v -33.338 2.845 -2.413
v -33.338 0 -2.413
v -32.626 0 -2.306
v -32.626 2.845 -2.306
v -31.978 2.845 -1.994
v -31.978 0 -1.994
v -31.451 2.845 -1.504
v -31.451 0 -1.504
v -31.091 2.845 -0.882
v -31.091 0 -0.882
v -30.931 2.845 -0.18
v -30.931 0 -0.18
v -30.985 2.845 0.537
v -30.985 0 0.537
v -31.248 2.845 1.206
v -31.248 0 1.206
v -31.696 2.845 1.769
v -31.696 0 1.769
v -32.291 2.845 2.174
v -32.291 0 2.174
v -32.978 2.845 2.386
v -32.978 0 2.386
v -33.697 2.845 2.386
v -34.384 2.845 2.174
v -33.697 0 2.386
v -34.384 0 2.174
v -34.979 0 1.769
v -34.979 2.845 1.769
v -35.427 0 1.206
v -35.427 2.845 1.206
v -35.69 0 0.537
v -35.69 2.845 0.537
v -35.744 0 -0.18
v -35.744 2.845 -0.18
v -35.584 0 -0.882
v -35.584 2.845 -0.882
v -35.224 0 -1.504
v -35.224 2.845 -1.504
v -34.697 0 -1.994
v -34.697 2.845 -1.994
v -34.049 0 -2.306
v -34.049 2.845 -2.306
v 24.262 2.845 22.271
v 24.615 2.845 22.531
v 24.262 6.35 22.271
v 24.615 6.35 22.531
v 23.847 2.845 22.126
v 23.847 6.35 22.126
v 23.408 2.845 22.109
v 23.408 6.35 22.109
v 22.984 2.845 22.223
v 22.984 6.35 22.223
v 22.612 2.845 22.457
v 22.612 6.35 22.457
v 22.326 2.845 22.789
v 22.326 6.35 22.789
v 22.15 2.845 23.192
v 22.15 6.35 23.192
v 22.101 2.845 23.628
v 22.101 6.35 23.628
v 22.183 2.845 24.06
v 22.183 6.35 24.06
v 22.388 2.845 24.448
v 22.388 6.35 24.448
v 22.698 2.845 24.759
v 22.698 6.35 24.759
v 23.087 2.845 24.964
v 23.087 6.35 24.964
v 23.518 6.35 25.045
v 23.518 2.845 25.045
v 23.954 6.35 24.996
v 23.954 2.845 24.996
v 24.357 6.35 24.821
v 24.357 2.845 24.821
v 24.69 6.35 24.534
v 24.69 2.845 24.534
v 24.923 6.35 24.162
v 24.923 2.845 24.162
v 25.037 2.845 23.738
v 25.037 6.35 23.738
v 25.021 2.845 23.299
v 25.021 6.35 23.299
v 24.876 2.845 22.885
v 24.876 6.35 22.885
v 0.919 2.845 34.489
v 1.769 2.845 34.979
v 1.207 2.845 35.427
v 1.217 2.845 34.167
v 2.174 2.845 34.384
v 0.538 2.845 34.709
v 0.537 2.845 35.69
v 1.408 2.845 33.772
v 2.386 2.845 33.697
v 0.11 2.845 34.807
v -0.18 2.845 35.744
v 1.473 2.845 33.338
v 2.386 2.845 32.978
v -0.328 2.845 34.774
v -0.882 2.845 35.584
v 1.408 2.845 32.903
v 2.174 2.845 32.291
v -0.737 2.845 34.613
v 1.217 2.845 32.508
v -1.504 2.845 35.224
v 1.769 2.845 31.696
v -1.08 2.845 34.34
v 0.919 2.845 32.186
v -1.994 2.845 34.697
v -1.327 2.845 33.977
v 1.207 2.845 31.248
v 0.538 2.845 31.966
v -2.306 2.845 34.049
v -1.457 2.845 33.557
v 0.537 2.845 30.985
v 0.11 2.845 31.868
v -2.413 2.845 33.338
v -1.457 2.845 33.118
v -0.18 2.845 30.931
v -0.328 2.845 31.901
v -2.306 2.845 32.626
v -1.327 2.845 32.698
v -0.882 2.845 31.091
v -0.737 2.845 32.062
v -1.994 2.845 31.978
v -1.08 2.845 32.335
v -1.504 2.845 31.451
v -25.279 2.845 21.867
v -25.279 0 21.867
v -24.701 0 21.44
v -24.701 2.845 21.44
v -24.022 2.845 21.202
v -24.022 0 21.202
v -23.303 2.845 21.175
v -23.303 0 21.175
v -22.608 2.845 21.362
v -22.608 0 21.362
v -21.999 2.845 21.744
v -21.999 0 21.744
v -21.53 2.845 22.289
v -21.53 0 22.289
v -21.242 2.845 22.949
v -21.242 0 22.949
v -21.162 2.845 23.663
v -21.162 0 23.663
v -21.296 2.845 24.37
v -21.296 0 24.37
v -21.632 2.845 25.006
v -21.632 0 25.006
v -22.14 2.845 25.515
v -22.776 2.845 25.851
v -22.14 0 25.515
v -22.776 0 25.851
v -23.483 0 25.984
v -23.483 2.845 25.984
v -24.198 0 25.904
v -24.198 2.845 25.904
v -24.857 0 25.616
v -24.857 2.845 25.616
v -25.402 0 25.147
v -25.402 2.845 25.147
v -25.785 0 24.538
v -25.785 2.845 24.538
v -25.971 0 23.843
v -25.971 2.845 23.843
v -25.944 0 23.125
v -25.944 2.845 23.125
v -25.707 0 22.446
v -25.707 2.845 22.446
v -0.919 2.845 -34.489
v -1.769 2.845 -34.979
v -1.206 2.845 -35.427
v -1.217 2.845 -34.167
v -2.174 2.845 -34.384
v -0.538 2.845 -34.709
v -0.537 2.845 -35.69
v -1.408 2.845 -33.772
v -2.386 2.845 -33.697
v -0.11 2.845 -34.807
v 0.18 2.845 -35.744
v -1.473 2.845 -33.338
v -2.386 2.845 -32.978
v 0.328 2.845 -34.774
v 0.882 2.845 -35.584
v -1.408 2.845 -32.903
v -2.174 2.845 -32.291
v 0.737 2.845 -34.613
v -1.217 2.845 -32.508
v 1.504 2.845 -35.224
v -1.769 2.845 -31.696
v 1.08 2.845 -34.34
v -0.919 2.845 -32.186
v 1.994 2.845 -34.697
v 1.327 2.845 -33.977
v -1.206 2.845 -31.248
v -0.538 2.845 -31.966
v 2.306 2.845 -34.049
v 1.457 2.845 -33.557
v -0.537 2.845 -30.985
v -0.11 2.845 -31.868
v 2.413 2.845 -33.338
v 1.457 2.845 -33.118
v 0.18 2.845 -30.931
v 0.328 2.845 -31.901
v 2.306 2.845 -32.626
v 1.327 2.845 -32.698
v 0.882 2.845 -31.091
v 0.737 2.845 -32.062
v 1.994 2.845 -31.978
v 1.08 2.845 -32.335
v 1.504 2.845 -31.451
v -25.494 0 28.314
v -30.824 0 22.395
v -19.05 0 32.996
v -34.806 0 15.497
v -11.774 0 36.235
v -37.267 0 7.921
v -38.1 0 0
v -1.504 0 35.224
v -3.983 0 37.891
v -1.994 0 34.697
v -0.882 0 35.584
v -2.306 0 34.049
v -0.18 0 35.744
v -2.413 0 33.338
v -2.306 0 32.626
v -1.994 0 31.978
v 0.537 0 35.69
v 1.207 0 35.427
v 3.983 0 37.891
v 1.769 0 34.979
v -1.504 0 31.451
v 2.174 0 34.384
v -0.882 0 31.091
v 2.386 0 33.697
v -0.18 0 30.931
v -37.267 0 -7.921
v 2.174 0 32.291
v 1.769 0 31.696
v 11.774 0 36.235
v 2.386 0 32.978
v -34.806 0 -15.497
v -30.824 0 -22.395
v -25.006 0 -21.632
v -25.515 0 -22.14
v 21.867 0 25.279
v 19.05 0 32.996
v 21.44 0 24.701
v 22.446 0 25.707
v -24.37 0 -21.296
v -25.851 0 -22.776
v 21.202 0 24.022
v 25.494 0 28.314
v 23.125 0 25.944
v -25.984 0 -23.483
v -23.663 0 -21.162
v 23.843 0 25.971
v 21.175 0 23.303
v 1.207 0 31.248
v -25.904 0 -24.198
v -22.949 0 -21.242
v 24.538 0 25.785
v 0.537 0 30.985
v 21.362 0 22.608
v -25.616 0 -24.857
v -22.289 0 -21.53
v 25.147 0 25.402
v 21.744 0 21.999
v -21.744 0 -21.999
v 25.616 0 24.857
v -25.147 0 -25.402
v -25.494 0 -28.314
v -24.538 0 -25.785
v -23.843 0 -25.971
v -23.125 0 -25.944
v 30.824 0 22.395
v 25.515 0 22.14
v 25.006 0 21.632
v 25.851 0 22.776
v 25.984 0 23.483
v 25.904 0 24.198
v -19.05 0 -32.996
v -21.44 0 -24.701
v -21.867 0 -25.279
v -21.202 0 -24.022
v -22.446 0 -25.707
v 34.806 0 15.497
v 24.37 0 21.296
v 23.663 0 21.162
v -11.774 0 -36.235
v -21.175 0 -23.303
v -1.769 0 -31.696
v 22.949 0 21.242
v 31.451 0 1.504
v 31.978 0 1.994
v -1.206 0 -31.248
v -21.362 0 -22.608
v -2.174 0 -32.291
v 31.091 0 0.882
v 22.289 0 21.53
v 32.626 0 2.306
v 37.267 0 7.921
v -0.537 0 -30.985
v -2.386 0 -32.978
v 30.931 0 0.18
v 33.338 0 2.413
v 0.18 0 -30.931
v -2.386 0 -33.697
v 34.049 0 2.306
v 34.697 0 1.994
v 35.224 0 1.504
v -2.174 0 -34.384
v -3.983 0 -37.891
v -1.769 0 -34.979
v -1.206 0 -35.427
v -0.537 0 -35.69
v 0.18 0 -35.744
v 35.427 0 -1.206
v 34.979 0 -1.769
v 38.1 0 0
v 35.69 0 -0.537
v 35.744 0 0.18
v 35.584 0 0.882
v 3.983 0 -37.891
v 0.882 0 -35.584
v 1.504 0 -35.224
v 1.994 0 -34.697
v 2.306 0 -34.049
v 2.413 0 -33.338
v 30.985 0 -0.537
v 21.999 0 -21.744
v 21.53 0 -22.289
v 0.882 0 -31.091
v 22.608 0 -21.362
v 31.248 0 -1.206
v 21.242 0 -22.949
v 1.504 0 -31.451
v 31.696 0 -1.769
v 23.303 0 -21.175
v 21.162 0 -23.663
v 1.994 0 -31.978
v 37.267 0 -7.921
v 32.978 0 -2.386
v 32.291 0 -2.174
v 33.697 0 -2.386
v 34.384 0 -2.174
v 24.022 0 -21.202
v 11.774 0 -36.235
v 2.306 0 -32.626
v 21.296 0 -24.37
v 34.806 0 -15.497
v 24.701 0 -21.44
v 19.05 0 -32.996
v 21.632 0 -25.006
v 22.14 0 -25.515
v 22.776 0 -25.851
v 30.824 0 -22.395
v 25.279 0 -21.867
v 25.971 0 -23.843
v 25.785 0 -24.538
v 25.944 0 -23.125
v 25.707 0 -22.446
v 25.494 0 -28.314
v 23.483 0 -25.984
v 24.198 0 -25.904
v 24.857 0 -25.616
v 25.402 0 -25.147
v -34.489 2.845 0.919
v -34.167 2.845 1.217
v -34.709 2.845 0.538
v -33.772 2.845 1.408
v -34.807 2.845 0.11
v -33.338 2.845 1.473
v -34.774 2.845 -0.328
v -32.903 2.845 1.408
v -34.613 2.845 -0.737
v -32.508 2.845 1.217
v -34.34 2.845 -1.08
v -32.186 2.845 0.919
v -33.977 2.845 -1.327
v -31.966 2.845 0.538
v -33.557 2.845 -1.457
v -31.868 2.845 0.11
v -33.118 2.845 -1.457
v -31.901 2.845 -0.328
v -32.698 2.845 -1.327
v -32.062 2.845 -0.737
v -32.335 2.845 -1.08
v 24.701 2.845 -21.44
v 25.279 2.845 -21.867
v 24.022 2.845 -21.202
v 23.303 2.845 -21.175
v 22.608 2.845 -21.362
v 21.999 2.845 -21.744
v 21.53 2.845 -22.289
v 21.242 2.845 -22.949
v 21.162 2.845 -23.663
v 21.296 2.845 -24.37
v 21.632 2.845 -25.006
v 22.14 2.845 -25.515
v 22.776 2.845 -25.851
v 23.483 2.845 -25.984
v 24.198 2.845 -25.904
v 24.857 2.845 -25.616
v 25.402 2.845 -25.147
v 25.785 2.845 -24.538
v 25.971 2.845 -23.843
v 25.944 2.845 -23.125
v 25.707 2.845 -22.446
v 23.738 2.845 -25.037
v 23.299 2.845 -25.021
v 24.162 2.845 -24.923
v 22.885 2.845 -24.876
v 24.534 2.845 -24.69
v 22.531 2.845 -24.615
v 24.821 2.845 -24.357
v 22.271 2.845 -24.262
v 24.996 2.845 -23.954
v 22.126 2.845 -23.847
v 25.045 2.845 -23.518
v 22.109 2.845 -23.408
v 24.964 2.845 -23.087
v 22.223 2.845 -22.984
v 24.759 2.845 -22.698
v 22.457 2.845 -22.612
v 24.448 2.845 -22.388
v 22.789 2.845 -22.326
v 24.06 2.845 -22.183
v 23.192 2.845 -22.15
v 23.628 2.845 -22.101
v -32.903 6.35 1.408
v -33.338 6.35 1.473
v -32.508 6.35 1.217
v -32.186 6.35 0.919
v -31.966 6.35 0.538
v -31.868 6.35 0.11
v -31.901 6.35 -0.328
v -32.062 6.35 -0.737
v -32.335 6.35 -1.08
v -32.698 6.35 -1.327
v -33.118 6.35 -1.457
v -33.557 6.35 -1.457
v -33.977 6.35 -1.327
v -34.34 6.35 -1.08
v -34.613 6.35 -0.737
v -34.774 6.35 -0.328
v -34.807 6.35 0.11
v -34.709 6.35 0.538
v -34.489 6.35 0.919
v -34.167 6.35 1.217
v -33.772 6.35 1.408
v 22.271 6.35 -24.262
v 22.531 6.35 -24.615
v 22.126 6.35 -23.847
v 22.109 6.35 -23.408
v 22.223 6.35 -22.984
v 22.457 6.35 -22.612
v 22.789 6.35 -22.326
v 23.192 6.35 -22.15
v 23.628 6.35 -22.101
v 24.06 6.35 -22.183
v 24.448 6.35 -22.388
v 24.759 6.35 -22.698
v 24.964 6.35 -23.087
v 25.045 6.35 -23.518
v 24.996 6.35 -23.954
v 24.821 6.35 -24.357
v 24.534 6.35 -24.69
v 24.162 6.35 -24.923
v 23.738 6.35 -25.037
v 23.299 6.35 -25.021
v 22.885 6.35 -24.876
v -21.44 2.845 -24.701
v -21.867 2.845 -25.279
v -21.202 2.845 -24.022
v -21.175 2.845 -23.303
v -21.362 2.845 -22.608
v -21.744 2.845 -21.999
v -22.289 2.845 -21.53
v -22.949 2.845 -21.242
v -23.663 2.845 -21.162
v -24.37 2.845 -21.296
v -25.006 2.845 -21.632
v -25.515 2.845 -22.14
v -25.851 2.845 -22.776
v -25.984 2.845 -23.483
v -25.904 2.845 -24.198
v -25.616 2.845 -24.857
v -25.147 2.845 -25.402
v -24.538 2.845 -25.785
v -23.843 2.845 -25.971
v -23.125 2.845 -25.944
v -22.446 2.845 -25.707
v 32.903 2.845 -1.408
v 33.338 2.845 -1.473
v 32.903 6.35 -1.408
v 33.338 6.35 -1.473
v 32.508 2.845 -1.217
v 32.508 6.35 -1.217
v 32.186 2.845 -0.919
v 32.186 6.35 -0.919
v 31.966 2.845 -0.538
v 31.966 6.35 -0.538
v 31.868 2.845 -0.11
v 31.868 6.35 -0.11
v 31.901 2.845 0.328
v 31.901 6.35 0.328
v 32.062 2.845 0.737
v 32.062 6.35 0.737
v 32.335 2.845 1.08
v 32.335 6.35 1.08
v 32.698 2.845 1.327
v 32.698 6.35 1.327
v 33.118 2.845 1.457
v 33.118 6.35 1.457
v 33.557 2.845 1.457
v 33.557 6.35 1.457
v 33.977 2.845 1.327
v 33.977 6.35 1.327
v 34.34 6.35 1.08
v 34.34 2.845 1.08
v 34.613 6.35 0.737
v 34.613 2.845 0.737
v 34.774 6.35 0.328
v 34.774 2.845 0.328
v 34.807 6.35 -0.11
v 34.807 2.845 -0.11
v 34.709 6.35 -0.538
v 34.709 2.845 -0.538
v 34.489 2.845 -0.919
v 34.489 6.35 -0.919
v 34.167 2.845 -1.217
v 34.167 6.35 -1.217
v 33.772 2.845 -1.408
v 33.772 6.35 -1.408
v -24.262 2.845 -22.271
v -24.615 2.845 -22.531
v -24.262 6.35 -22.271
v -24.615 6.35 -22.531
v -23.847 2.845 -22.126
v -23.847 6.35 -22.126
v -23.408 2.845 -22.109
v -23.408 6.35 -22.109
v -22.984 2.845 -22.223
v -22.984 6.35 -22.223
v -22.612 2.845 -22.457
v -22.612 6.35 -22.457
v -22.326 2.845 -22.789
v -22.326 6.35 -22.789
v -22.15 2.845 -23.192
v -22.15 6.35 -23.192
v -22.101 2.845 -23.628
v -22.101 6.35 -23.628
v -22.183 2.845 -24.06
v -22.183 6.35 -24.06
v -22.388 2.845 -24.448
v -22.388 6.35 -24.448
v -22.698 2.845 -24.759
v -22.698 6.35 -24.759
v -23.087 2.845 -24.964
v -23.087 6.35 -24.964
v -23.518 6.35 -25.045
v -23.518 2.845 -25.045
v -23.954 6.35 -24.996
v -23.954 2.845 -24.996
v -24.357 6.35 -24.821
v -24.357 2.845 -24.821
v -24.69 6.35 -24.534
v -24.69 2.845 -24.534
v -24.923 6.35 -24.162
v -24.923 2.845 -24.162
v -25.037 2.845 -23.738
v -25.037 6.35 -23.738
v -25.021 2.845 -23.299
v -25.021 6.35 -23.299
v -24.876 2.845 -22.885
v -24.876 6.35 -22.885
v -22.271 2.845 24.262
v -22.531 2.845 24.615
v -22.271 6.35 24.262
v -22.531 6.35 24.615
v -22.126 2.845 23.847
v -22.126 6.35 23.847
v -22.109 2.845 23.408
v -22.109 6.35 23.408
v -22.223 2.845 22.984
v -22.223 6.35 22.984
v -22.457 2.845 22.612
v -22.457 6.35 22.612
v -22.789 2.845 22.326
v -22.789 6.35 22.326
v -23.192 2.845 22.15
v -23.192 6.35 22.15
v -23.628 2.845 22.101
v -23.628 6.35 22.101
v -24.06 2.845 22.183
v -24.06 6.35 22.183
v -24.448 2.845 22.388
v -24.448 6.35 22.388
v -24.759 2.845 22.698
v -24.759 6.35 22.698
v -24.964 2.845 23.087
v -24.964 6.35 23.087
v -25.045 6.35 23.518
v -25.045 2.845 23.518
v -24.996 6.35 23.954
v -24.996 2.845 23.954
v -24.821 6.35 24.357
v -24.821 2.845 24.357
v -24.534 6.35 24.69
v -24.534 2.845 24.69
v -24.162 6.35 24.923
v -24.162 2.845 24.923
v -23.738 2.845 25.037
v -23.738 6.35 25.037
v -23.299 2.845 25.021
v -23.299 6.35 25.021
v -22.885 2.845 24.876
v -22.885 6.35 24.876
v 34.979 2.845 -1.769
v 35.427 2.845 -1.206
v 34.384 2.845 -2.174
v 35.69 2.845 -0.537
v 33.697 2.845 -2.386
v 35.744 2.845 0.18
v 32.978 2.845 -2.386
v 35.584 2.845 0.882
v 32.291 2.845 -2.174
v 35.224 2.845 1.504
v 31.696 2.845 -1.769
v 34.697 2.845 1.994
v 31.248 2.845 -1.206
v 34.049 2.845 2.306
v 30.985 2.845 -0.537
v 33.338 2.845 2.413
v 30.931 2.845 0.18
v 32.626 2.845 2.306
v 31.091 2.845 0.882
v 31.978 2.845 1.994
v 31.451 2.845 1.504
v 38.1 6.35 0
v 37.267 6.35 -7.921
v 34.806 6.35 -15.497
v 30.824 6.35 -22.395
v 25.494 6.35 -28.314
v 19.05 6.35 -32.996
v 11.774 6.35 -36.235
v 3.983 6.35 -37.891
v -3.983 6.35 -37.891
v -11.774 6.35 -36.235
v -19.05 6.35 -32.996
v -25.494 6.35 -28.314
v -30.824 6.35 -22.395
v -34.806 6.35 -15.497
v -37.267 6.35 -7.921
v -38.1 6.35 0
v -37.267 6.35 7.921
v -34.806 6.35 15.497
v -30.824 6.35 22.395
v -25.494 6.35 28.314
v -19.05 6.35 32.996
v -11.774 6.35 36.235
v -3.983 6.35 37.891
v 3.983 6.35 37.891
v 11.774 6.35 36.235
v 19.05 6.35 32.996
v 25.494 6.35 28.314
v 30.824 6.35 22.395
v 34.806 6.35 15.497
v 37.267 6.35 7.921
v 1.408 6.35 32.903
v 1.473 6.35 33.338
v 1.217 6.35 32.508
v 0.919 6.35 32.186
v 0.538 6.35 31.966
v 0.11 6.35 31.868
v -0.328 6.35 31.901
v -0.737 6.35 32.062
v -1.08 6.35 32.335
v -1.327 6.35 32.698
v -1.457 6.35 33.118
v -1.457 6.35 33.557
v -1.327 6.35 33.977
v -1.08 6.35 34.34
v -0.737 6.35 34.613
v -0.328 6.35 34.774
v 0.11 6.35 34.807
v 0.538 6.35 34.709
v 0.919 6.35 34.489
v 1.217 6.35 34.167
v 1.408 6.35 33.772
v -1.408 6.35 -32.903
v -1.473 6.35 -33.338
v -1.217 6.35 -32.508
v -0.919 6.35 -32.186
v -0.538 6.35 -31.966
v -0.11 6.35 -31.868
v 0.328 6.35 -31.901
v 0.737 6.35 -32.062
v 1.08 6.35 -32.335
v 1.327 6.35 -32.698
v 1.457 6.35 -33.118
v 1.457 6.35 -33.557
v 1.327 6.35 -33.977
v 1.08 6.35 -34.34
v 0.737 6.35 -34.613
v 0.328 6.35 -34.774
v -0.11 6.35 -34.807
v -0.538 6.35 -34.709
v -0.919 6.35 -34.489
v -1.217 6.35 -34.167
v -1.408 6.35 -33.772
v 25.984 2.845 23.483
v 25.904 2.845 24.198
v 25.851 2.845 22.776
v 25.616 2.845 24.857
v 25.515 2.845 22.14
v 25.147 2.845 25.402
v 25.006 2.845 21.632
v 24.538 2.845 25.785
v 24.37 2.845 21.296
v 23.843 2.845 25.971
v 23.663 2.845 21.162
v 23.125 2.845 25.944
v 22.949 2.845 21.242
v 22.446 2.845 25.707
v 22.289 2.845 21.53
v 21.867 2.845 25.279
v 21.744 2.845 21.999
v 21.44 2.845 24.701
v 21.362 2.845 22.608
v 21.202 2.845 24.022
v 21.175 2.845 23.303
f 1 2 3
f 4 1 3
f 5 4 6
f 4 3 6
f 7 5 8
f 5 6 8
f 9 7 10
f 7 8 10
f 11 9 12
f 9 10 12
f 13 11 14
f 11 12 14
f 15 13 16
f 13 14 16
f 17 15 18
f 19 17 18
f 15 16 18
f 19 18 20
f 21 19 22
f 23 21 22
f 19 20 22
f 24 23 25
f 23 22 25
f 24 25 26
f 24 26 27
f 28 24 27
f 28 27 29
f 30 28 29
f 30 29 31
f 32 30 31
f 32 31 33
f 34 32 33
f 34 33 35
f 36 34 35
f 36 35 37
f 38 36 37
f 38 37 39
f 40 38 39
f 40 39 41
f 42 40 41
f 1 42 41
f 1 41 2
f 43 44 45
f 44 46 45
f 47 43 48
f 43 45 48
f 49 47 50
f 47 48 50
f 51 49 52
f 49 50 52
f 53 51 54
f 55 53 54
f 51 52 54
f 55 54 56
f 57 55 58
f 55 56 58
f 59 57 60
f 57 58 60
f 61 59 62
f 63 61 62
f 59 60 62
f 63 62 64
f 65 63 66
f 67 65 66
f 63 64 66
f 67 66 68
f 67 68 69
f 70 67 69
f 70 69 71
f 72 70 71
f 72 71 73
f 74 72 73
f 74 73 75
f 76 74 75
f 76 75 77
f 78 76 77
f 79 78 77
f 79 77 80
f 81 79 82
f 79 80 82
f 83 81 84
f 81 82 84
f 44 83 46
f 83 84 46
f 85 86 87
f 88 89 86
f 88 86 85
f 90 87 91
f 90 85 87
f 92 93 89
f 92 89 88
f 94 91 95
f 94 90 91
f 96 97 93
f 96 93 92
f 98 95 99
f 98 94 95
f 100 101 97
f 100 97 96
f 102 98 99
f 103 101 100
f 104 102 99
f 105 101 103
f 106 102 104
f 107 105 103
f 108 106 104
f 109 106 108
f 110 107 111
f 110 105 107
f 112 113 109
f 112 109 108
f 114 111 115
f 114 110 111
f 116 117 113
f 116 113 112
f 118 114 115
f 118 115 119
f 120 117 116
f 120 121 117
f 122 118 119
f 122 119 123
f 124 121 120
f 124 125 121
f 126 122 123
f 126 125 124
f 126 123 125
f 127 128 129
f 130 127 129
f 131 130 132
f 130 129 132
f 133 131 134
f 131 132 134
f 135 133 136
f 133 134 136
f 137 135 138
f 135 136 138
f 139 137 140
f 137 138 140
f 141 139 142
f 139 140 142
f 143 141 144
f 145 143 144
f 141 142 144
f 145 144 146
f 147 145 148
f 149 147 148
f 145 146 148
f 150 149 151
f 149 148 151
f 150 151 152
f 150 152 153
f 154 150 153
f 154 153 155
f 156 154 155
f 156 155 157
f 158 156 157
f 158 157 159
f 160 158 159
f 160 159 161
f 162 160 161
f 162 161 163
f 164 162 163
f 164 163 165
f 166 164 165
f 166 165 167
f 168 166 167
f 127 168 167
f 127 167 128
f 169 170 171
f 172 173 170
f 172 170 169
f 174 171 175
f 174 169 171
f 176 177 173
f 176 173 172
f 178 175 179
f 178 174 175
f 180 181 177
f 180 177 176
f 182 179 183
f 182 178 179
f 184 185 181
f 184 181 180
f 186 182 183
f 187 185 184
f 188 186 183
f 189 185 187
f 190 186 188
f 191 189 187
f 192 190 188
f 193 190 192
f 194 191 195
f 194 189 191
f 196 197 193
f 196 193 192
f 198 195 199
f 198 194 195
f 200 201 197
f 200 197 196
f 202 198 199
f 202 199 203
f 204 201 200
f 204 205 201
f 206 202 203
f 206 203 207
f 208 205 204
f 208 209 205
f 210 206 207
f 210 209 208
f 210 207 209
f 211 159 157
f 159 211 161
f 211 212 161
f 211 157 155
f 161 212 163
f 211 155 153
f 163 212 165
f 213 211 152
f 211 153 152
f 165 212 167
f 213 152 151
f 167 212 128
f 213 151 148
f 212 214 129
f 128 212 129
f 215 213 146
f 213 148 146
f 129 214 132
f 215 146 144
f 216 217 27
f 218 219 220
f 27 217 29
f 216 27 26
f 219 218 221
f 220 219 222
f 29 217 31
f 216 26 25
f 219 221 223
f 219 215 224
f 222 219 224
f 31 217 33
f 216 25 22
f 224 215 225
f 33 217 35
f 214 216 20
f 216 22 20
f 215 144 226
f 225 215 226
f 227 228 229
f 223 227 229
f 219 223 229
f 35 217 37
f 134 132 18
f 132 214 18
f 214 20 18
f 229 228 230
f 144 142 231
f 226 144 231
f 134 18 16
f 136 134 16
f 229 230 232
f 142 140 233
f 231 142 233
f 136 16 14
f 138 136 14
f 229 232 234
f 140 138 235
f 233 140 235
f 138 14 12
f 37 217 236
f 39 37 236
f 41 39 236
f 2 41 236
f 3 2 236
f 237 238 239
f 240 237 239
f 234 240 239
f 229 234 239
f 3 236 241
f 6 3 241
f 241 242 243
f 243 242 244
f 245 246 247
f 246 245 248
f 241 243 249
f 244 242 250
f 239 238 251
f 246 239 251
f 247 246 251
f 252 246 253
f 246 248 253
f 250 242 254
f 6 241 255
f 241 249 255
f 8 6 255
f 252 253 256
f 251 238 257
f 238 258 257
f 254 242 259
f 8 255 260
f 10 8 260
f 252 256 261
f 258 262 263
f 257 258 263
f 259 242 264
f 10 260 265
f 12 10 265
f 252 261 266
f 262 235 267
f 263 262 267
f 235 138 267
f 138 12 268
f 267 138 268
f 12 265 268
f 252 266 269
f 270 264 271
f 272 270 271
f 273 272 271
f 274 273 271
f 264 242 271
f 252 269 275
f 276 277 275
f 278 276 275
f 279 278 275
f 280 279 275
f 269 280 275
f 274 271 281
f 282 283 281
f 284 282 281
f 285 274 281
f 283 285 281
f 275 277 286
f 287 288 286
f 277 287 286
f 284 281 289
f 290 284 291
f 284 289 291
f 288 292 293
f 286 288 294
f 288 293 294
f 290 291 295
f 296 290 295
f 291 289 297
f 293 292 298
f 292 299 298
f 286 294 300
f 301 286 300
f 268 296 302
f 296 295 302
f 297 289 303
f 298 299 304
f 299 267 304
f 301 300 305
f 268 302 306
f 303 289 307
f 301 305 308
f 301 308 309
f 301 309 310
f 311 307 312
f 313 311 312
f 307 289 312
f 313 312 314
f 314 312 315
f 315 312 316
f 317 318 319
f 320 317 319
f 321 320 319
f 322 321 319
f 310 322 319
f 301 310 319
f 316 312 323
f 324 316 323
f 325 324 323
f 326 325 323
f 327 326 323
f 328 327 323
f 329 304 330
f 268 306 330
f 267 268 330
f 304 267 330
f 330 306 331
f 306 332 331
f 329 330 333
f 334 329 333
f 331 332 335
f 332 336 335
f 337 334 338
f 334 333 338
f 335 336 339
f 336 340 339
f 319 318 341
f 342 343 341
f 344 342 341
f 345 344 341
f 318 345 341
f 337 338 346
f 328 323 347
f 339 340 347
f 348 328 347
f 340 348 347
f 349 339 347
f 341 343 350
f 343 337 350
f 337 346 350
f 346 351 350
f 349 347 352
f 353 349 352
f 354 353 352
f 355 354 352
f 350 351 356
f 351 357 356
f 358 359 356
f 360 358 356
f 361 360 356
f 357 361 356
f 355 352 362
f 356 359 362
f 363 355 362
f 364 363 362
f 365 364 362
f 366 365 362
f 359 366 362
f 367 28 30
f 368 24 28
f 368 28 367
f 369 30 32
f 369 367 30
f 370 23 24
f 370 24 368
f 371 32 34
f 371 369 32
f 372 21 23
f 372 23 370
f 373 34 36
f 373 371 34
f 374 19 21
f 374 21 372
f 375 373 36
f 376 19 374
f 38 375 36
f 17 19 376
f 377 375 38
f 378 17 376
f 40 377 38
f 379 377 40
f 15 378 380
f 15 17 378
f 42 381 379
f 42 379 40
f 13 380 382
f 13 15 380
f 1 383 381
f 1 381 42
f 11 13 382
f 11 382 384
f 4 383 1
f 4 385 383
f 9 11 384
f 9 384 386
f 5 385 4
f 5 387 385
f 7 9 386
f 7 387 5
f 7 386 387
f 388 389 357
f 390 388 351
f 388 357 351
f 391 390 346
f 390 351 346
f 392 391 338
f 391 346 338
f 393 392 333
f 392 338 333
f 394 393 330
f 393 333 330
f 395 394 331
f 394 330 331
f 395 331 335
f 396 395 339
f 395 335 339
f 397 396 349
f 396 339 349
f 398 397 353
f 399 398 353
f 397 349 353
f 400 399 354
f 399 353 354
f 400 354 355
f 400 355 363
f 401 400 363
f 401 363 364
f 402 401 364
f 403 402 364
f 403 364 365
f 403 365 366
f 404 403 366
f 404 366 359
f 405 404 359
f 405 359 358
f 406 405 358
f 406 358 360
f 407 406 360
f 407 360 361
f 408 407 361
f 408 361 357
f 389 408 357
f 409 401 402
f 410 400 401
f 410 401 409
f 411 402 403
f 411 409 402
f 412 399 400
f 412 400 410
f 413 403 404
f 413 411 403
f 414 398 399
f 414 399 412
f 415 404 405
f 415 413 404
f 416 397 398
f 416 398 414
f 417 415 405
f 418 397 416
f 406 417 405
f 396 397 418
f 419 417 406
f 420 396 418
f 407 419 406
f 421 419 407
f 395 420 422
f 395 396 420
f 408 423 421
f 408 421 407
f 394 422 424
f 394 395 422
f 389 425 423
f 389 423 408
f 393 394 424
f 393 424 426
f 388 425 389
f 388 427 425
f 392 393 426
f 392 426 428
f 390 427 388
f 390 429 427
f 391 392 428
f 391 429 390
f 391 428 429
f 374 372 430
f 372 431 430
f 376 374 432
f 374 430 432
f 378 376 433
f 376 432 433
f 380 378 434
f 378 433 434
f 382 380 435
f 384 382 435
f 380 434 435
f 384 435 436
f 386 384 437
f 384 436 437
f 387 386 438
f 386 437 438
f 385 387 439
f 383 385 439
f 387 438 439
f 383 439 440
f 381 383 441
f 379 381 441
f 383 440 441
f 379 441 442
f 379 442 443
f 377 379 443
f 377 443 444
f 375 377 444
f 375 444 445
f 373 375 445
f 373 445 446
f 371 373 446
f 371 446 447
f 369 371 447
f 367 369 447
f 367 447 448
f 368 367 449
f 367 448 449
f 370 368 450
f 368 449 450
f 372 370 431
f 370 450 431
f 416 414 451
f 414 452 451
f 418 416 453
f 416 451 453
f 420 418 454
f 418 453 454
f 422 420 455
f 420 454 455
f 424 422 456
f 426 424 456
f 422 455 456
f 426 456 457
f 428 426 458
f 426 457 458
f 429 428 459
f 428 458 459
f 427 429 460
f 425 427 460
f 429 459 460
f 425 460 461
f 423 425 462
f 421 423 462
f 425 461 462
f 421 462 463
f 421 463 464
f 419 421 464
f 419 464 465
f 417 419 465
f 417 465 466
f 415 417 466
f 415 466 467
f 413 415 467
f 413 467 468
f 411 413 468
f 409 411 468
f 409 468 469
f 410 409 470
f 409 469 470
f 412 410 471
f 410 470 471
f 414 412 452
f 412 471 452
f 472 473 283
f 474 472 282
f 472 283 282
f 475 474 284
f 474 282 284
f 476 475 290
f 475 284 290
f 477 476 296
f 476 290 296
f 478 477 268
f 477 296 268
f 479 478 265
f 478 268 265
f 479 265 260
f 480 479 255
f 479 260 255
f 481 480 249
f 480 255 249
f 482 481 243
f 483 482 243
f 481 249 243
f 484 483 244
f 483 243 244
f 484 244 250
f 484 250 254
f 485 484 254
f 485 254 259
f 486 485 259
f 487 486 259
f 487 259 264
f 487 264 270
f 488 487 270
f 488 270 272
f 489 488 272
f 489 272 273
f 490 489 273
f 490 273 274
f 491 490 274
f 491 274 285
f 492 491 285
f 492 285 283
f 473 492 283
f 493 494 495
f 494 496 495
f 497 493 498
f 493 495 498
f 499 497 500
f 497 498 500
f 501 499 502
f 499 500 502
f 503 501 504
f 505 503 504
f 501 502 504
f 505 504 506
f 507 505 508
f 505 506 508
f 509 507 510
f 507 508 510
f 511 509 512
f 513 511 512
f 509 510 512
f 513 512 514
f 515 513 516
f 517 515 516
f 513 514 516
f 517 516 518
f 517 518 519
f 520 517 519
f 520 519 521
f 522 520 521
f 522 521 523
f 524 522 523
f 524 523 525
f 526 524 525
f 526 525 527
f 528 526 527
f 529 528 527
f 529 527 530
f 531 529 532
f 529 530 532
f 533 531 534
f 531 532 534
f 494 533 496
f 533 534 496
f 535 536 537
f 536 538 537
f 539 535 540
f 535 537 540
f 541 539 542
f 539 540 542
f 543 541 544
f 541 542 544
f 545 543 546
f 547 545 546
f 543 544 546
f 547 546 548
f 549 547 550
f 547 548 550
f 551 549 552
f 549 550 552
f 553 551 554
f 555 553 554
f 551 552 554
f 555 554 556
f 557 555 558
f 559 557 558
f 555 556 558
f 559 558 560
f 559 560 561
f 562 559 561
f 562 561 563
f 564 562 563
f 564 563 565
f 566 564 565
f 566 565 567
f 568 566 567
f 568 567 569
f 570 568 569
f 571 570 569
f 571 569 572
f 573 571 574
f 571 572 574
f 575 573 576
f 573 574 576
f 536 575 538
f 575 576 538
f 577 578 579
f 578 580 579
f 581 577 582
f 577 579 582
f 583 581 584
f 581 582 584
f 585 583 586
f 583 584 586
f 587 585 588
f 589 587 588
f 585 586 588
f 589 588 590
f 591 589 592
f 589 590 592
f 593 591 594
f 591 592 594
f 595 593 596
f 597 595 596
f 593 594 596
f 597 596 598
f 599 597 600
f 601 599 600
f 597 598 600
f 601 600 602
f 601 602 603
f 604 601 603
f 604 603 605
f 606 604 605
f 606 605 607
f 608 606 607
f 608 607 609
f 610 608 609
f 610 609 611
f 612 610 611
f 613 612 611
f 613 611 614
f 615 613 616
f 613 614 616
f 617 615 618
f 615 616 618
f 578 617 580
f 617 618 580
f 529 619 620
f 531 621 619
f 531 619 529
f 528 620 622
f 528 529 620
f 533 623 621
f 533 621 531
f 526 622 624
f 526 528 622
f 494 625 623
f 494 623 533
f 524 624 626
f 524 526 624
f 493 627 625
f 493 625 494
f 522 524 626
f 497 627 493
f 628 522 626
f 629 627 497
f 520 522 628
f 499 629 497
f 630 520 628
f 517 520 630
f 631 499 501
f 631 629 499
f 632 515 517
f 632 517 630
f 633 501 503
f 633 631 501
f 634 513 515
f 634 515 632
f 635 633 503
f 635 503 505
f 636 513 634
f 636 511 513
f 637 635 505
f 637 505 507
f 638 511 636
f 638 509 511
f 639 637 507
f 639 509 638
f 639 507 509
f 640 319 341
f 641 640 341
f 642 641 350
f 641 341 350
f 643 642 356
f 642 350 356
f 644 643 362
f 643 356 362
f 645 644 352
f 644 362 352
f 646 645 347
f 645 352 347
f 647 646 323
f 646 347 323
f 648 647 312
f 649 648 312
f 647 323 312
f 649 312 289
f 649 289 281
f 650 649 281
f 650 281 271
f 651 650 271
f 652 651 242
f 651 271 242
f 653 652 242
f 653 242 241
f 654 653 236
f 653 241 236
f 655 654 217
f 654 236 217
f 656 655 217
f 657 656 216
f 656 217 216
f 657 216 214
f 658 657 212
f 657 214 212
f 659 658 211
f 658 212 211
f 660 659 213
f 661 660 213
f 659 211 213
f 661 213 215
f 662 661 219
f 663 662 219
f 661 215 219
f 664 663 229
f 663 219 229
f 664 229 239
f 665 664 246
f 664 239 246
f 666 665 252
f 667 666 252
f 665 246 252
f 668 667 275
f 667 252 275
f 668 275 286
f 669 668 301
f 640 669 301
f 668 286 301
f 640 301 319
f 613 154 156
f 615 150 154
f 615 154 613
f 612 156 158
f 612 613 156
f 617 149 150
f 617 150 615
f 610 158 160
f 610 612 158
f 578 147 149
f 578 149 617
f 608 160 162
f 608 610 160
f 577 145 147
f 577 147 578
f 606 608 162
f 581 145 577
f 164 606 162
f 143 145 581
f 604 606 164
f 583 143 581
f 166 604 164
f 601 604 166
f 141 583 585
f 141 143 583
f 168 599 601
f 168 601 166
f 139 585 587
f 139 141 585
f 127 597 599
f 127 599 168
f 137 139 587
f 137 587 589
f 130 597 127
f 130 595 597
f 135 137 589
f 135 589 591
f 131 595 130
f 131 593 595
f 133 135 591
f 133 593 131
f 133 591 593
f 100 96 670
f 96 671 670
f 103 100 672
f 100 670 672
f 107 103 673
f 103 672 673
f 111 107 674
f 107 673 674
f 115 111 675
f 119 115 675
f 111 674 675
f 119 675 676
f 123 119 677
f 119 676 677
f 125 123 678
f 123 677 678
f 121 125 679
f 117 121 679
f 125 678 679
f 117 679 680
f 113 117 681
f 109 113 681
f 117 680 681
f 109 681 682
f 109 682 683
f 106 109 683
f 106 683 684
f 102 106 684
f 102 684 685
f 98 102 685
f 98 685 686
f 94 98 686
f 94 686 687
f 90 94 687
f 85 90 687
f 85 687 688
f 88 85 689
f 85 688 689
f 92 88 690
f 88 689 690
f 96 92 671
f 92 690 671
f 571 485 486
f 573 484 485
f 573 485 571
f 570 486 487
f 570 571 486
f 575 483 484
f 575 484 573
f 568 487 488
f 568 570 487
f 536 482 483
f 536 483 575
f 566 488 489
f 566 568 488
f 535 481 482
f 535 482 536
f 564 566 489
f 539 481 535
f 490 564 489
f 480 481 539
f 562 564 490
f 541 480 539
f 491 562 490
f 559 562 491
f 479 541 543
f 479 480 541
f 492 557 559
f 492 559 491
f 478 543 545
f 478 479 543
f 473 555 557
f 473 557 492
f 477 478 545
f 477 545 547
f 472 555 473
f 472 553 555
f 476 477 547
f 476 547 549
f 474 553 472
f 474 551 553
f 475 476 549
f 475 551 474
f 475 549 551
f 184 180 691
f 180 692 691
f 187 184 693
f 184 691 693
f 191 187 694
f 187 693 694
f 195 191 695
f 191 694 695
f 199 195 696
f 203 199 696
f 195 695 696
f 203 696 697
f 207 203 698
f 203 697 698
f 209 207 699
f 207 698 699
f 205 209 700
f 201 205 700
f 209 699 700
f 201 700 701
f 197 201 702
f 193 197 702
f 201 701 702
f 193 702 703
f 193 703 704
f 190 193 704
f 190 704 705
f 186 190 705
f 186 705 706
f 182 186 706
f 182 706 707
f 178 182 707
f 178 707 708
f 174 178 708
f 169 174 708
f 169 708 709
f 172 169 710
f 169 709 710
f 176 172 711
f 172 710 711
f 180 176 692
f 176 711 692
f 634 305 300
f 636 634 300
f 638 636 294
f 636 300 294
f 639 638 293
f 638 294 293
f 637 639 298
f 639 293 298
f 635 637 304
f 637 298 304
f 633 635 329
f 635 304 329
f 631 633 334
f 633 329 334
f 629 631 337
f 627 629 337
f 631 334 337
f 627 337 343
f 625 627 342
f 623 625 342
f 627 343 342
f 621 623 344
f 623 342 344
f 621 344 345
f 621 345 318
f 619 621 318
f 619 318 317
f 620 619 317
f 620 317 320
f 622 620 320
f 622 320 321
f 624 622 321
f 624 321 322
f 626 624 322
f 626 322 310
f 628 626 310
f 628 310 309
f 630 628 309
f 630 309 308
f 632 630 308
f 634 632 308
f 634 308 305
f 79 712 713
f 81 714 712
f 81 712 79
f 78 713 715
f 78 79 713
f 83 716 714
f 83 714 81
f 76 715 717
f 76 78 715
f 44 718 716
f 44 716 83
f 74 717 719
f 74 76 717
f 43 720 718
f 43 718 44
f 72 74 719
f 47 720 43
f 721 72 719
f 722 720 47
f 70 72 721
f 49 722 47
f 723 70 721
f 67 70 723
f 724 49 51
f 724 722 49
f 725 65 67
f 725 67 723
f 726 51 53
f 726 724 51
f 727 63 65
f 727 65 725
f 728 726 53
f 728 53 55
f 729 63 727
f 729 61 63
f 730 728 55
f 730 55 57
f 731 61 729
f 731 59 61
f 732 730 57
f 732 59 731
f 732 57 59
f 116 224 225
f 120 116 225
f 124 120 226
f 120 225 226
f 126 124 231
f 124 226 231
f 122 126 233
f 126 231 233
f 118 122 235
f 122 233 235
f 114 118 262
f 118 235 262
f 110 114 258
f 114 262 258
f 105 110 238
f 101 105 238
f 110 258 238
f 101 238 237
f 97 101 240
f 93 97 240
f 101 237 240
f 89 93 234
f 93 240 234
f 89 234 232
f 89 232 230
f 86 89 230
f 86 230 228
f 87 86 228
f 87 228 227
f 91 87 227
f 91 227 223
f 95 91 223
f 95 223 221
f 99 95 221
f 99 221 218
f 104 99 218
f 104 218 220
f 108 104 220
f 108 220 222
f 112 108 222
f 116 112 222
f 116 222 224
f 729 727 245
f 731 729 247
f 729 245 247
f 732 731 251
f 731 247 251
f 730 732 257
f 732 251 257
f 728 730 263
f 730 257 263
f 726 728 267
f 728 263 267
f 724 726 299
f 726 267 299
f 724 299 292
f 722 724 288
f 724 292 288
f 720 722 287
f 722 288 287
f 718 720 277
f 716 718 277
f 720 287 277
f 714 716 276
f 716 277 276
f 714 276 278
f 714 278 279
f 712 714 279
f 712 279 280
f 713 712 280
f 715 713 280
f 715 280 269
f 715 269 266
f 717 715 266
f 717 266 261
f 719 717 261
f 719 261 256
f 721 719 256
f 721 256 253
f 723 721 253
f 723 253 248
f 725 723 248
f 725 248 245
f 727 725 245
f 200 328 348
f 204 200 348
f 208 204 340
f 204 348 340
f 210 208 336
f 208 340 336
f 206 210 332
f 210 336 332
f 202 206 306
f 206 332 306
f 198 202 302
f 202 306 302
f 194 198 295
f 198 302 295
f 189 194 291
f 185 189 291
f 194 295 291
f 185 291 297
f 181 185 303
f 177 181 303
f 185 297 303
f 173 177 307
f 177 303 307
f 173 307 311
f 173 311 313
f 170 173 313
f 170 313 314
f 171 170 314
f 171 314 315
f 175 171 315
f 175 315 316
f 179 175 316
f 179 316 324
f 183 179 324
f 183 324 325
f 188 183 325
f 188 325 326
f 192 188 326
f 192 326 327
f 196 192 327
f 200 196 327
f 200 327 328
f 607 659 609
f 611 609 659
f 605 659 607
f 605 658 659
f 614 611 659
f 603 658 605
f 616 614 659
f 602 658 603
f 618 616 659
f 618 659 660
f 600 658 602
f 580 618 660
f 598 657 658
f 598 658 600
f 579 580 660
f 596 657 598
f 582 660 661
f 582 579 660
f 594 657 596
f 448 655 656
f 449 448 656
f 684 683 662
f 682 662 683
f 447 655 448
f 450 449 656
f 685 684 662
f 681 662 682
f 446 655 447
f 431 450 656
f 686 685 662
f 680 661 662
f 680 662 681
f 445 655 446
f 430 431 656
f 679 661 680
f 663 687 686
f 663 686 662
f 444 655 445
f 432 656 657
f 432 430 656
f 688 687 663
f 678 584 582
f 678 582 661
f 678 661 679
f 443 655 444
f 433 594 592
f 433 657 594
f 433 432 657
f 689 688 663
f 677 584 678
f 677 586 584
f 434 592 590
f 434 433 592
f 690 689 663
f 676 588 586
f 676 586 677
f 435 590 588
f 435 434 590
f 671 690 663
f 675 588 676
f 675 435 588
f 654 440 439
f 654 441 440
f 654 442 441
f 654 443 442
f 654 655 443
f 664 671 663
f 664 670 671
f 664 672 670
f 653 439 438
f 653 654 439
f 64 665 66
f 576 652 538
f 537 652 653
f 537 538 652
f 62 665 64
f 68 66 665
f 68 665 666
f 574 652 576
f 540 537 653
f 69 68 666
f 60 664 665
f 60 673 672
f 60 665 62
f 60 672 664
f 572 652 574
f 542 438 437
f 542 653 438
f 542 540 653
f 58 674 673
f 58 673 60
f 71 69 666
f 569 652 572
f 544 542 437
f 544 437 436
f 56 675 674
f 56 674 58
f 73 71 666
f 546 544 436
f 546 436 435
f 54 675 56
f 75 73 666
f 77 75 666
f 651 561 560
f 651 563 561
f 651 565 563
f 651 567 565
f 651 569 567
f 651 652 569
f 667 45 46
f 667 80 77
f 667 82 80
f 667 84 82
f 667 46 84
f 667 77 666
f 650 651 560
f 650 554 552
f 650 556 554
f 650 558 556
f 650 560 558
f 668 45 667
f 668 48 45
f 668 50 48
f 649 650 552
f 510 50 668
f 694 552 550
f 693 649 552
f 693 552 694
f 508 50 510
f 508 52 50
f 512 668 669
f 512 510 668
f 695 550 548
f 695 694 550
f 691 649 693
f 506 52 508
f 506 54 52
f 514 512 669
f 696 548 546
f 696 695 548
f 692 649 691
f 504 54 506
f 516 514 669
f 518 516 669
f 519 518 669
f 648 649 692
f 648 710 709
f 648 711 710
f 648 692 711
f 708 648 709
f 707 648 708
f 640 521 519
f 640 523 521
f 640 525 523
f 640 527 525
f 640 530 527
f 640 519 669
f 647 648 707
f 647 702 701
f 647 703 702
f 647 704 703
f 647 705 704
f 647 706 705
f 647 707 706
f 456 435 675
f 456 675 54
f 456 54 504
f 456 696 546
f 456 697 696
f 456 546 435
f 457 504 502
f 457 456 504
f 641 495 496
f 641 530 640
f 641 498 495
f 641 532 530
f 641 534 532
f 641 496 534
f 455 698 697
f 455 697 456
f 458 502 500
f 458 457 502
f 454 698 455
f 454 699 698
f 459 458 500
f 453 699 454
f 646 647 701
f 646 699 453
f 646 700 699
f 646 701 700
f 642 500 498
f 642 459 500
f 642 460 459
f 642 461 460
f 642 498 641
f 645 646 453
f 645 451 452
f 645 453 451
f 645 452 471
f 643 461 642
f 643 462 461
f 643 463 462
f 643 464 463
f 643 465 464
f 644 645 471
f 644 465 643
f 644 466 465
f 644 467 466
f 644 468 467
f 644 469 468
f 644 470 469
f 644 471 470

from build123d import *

# Parameters (mm, degrees)
SKETCH1_R                                      = 38.1
BOSS_EXTRUDE1_DEPTH                            = 6.35
CBORE_FOR_4_BUTTON_HEAD_CAP_SCREW1_D           = 2.9464
CBORE_FOR_4_BUTTON_HEAD_CAP_SCREW1_CBORE_D     = 4.826
CBORE_FOR_4_BUTTON_HEAD_CAP_SCREW1_CBORE_DEPTH = 2.8448
CIRPATTERN1_COUNT                              = 8


with BuildPart() as part:
    # Sketch1 → Boss-Extrude1 (new body)
    with BuildSketch(Plane(origin=(0, 0, 0), x_dir=(1, 0, 0), z_dir=(0, 1, 0))):
        Circle(SKETCH1_R)
    extrude(amount=BOSS_EXTRUDE1_DEPTH)

    # CBORE for #4 Button Head Cap Screw1 (through all)
    with Locations(Plane(origin=(0, 0, 0), x_dir=(-1, 0, 0), z_dir=(0, -1, 0))):
        with Locations((0, -33.3375)):
            cbore_for_4_button_head_cap_screw1 = CounterBoreHole(CBORE_FOR_4_BUTTON_HEAD_CAP_SCREW1_D / 2, CBORE_FOR_4_BUTTON_HEAD_CAP_SCREW1_CBORE_D / 2, CBORE_FOR_4_BUTTON_HEAD_CAP_SCREW1_CBORE_DEPTH)

    # CirPattern1: CBORE for #4 Button Head Cap Screw1 ×8 about axis
    cirpattern1_axis = Axis((0, 0, 0), (0, 1, 0))
    for i in range(1, CIRPATTERN1_COUNT):
        add(cbore_for_4_button_head_cap_screw1.rotate(cirpattern1_axis, i * 360 / CIRPATTERN1_COUNT), mode=Mode.SUBTRACT)


solid = part.part
